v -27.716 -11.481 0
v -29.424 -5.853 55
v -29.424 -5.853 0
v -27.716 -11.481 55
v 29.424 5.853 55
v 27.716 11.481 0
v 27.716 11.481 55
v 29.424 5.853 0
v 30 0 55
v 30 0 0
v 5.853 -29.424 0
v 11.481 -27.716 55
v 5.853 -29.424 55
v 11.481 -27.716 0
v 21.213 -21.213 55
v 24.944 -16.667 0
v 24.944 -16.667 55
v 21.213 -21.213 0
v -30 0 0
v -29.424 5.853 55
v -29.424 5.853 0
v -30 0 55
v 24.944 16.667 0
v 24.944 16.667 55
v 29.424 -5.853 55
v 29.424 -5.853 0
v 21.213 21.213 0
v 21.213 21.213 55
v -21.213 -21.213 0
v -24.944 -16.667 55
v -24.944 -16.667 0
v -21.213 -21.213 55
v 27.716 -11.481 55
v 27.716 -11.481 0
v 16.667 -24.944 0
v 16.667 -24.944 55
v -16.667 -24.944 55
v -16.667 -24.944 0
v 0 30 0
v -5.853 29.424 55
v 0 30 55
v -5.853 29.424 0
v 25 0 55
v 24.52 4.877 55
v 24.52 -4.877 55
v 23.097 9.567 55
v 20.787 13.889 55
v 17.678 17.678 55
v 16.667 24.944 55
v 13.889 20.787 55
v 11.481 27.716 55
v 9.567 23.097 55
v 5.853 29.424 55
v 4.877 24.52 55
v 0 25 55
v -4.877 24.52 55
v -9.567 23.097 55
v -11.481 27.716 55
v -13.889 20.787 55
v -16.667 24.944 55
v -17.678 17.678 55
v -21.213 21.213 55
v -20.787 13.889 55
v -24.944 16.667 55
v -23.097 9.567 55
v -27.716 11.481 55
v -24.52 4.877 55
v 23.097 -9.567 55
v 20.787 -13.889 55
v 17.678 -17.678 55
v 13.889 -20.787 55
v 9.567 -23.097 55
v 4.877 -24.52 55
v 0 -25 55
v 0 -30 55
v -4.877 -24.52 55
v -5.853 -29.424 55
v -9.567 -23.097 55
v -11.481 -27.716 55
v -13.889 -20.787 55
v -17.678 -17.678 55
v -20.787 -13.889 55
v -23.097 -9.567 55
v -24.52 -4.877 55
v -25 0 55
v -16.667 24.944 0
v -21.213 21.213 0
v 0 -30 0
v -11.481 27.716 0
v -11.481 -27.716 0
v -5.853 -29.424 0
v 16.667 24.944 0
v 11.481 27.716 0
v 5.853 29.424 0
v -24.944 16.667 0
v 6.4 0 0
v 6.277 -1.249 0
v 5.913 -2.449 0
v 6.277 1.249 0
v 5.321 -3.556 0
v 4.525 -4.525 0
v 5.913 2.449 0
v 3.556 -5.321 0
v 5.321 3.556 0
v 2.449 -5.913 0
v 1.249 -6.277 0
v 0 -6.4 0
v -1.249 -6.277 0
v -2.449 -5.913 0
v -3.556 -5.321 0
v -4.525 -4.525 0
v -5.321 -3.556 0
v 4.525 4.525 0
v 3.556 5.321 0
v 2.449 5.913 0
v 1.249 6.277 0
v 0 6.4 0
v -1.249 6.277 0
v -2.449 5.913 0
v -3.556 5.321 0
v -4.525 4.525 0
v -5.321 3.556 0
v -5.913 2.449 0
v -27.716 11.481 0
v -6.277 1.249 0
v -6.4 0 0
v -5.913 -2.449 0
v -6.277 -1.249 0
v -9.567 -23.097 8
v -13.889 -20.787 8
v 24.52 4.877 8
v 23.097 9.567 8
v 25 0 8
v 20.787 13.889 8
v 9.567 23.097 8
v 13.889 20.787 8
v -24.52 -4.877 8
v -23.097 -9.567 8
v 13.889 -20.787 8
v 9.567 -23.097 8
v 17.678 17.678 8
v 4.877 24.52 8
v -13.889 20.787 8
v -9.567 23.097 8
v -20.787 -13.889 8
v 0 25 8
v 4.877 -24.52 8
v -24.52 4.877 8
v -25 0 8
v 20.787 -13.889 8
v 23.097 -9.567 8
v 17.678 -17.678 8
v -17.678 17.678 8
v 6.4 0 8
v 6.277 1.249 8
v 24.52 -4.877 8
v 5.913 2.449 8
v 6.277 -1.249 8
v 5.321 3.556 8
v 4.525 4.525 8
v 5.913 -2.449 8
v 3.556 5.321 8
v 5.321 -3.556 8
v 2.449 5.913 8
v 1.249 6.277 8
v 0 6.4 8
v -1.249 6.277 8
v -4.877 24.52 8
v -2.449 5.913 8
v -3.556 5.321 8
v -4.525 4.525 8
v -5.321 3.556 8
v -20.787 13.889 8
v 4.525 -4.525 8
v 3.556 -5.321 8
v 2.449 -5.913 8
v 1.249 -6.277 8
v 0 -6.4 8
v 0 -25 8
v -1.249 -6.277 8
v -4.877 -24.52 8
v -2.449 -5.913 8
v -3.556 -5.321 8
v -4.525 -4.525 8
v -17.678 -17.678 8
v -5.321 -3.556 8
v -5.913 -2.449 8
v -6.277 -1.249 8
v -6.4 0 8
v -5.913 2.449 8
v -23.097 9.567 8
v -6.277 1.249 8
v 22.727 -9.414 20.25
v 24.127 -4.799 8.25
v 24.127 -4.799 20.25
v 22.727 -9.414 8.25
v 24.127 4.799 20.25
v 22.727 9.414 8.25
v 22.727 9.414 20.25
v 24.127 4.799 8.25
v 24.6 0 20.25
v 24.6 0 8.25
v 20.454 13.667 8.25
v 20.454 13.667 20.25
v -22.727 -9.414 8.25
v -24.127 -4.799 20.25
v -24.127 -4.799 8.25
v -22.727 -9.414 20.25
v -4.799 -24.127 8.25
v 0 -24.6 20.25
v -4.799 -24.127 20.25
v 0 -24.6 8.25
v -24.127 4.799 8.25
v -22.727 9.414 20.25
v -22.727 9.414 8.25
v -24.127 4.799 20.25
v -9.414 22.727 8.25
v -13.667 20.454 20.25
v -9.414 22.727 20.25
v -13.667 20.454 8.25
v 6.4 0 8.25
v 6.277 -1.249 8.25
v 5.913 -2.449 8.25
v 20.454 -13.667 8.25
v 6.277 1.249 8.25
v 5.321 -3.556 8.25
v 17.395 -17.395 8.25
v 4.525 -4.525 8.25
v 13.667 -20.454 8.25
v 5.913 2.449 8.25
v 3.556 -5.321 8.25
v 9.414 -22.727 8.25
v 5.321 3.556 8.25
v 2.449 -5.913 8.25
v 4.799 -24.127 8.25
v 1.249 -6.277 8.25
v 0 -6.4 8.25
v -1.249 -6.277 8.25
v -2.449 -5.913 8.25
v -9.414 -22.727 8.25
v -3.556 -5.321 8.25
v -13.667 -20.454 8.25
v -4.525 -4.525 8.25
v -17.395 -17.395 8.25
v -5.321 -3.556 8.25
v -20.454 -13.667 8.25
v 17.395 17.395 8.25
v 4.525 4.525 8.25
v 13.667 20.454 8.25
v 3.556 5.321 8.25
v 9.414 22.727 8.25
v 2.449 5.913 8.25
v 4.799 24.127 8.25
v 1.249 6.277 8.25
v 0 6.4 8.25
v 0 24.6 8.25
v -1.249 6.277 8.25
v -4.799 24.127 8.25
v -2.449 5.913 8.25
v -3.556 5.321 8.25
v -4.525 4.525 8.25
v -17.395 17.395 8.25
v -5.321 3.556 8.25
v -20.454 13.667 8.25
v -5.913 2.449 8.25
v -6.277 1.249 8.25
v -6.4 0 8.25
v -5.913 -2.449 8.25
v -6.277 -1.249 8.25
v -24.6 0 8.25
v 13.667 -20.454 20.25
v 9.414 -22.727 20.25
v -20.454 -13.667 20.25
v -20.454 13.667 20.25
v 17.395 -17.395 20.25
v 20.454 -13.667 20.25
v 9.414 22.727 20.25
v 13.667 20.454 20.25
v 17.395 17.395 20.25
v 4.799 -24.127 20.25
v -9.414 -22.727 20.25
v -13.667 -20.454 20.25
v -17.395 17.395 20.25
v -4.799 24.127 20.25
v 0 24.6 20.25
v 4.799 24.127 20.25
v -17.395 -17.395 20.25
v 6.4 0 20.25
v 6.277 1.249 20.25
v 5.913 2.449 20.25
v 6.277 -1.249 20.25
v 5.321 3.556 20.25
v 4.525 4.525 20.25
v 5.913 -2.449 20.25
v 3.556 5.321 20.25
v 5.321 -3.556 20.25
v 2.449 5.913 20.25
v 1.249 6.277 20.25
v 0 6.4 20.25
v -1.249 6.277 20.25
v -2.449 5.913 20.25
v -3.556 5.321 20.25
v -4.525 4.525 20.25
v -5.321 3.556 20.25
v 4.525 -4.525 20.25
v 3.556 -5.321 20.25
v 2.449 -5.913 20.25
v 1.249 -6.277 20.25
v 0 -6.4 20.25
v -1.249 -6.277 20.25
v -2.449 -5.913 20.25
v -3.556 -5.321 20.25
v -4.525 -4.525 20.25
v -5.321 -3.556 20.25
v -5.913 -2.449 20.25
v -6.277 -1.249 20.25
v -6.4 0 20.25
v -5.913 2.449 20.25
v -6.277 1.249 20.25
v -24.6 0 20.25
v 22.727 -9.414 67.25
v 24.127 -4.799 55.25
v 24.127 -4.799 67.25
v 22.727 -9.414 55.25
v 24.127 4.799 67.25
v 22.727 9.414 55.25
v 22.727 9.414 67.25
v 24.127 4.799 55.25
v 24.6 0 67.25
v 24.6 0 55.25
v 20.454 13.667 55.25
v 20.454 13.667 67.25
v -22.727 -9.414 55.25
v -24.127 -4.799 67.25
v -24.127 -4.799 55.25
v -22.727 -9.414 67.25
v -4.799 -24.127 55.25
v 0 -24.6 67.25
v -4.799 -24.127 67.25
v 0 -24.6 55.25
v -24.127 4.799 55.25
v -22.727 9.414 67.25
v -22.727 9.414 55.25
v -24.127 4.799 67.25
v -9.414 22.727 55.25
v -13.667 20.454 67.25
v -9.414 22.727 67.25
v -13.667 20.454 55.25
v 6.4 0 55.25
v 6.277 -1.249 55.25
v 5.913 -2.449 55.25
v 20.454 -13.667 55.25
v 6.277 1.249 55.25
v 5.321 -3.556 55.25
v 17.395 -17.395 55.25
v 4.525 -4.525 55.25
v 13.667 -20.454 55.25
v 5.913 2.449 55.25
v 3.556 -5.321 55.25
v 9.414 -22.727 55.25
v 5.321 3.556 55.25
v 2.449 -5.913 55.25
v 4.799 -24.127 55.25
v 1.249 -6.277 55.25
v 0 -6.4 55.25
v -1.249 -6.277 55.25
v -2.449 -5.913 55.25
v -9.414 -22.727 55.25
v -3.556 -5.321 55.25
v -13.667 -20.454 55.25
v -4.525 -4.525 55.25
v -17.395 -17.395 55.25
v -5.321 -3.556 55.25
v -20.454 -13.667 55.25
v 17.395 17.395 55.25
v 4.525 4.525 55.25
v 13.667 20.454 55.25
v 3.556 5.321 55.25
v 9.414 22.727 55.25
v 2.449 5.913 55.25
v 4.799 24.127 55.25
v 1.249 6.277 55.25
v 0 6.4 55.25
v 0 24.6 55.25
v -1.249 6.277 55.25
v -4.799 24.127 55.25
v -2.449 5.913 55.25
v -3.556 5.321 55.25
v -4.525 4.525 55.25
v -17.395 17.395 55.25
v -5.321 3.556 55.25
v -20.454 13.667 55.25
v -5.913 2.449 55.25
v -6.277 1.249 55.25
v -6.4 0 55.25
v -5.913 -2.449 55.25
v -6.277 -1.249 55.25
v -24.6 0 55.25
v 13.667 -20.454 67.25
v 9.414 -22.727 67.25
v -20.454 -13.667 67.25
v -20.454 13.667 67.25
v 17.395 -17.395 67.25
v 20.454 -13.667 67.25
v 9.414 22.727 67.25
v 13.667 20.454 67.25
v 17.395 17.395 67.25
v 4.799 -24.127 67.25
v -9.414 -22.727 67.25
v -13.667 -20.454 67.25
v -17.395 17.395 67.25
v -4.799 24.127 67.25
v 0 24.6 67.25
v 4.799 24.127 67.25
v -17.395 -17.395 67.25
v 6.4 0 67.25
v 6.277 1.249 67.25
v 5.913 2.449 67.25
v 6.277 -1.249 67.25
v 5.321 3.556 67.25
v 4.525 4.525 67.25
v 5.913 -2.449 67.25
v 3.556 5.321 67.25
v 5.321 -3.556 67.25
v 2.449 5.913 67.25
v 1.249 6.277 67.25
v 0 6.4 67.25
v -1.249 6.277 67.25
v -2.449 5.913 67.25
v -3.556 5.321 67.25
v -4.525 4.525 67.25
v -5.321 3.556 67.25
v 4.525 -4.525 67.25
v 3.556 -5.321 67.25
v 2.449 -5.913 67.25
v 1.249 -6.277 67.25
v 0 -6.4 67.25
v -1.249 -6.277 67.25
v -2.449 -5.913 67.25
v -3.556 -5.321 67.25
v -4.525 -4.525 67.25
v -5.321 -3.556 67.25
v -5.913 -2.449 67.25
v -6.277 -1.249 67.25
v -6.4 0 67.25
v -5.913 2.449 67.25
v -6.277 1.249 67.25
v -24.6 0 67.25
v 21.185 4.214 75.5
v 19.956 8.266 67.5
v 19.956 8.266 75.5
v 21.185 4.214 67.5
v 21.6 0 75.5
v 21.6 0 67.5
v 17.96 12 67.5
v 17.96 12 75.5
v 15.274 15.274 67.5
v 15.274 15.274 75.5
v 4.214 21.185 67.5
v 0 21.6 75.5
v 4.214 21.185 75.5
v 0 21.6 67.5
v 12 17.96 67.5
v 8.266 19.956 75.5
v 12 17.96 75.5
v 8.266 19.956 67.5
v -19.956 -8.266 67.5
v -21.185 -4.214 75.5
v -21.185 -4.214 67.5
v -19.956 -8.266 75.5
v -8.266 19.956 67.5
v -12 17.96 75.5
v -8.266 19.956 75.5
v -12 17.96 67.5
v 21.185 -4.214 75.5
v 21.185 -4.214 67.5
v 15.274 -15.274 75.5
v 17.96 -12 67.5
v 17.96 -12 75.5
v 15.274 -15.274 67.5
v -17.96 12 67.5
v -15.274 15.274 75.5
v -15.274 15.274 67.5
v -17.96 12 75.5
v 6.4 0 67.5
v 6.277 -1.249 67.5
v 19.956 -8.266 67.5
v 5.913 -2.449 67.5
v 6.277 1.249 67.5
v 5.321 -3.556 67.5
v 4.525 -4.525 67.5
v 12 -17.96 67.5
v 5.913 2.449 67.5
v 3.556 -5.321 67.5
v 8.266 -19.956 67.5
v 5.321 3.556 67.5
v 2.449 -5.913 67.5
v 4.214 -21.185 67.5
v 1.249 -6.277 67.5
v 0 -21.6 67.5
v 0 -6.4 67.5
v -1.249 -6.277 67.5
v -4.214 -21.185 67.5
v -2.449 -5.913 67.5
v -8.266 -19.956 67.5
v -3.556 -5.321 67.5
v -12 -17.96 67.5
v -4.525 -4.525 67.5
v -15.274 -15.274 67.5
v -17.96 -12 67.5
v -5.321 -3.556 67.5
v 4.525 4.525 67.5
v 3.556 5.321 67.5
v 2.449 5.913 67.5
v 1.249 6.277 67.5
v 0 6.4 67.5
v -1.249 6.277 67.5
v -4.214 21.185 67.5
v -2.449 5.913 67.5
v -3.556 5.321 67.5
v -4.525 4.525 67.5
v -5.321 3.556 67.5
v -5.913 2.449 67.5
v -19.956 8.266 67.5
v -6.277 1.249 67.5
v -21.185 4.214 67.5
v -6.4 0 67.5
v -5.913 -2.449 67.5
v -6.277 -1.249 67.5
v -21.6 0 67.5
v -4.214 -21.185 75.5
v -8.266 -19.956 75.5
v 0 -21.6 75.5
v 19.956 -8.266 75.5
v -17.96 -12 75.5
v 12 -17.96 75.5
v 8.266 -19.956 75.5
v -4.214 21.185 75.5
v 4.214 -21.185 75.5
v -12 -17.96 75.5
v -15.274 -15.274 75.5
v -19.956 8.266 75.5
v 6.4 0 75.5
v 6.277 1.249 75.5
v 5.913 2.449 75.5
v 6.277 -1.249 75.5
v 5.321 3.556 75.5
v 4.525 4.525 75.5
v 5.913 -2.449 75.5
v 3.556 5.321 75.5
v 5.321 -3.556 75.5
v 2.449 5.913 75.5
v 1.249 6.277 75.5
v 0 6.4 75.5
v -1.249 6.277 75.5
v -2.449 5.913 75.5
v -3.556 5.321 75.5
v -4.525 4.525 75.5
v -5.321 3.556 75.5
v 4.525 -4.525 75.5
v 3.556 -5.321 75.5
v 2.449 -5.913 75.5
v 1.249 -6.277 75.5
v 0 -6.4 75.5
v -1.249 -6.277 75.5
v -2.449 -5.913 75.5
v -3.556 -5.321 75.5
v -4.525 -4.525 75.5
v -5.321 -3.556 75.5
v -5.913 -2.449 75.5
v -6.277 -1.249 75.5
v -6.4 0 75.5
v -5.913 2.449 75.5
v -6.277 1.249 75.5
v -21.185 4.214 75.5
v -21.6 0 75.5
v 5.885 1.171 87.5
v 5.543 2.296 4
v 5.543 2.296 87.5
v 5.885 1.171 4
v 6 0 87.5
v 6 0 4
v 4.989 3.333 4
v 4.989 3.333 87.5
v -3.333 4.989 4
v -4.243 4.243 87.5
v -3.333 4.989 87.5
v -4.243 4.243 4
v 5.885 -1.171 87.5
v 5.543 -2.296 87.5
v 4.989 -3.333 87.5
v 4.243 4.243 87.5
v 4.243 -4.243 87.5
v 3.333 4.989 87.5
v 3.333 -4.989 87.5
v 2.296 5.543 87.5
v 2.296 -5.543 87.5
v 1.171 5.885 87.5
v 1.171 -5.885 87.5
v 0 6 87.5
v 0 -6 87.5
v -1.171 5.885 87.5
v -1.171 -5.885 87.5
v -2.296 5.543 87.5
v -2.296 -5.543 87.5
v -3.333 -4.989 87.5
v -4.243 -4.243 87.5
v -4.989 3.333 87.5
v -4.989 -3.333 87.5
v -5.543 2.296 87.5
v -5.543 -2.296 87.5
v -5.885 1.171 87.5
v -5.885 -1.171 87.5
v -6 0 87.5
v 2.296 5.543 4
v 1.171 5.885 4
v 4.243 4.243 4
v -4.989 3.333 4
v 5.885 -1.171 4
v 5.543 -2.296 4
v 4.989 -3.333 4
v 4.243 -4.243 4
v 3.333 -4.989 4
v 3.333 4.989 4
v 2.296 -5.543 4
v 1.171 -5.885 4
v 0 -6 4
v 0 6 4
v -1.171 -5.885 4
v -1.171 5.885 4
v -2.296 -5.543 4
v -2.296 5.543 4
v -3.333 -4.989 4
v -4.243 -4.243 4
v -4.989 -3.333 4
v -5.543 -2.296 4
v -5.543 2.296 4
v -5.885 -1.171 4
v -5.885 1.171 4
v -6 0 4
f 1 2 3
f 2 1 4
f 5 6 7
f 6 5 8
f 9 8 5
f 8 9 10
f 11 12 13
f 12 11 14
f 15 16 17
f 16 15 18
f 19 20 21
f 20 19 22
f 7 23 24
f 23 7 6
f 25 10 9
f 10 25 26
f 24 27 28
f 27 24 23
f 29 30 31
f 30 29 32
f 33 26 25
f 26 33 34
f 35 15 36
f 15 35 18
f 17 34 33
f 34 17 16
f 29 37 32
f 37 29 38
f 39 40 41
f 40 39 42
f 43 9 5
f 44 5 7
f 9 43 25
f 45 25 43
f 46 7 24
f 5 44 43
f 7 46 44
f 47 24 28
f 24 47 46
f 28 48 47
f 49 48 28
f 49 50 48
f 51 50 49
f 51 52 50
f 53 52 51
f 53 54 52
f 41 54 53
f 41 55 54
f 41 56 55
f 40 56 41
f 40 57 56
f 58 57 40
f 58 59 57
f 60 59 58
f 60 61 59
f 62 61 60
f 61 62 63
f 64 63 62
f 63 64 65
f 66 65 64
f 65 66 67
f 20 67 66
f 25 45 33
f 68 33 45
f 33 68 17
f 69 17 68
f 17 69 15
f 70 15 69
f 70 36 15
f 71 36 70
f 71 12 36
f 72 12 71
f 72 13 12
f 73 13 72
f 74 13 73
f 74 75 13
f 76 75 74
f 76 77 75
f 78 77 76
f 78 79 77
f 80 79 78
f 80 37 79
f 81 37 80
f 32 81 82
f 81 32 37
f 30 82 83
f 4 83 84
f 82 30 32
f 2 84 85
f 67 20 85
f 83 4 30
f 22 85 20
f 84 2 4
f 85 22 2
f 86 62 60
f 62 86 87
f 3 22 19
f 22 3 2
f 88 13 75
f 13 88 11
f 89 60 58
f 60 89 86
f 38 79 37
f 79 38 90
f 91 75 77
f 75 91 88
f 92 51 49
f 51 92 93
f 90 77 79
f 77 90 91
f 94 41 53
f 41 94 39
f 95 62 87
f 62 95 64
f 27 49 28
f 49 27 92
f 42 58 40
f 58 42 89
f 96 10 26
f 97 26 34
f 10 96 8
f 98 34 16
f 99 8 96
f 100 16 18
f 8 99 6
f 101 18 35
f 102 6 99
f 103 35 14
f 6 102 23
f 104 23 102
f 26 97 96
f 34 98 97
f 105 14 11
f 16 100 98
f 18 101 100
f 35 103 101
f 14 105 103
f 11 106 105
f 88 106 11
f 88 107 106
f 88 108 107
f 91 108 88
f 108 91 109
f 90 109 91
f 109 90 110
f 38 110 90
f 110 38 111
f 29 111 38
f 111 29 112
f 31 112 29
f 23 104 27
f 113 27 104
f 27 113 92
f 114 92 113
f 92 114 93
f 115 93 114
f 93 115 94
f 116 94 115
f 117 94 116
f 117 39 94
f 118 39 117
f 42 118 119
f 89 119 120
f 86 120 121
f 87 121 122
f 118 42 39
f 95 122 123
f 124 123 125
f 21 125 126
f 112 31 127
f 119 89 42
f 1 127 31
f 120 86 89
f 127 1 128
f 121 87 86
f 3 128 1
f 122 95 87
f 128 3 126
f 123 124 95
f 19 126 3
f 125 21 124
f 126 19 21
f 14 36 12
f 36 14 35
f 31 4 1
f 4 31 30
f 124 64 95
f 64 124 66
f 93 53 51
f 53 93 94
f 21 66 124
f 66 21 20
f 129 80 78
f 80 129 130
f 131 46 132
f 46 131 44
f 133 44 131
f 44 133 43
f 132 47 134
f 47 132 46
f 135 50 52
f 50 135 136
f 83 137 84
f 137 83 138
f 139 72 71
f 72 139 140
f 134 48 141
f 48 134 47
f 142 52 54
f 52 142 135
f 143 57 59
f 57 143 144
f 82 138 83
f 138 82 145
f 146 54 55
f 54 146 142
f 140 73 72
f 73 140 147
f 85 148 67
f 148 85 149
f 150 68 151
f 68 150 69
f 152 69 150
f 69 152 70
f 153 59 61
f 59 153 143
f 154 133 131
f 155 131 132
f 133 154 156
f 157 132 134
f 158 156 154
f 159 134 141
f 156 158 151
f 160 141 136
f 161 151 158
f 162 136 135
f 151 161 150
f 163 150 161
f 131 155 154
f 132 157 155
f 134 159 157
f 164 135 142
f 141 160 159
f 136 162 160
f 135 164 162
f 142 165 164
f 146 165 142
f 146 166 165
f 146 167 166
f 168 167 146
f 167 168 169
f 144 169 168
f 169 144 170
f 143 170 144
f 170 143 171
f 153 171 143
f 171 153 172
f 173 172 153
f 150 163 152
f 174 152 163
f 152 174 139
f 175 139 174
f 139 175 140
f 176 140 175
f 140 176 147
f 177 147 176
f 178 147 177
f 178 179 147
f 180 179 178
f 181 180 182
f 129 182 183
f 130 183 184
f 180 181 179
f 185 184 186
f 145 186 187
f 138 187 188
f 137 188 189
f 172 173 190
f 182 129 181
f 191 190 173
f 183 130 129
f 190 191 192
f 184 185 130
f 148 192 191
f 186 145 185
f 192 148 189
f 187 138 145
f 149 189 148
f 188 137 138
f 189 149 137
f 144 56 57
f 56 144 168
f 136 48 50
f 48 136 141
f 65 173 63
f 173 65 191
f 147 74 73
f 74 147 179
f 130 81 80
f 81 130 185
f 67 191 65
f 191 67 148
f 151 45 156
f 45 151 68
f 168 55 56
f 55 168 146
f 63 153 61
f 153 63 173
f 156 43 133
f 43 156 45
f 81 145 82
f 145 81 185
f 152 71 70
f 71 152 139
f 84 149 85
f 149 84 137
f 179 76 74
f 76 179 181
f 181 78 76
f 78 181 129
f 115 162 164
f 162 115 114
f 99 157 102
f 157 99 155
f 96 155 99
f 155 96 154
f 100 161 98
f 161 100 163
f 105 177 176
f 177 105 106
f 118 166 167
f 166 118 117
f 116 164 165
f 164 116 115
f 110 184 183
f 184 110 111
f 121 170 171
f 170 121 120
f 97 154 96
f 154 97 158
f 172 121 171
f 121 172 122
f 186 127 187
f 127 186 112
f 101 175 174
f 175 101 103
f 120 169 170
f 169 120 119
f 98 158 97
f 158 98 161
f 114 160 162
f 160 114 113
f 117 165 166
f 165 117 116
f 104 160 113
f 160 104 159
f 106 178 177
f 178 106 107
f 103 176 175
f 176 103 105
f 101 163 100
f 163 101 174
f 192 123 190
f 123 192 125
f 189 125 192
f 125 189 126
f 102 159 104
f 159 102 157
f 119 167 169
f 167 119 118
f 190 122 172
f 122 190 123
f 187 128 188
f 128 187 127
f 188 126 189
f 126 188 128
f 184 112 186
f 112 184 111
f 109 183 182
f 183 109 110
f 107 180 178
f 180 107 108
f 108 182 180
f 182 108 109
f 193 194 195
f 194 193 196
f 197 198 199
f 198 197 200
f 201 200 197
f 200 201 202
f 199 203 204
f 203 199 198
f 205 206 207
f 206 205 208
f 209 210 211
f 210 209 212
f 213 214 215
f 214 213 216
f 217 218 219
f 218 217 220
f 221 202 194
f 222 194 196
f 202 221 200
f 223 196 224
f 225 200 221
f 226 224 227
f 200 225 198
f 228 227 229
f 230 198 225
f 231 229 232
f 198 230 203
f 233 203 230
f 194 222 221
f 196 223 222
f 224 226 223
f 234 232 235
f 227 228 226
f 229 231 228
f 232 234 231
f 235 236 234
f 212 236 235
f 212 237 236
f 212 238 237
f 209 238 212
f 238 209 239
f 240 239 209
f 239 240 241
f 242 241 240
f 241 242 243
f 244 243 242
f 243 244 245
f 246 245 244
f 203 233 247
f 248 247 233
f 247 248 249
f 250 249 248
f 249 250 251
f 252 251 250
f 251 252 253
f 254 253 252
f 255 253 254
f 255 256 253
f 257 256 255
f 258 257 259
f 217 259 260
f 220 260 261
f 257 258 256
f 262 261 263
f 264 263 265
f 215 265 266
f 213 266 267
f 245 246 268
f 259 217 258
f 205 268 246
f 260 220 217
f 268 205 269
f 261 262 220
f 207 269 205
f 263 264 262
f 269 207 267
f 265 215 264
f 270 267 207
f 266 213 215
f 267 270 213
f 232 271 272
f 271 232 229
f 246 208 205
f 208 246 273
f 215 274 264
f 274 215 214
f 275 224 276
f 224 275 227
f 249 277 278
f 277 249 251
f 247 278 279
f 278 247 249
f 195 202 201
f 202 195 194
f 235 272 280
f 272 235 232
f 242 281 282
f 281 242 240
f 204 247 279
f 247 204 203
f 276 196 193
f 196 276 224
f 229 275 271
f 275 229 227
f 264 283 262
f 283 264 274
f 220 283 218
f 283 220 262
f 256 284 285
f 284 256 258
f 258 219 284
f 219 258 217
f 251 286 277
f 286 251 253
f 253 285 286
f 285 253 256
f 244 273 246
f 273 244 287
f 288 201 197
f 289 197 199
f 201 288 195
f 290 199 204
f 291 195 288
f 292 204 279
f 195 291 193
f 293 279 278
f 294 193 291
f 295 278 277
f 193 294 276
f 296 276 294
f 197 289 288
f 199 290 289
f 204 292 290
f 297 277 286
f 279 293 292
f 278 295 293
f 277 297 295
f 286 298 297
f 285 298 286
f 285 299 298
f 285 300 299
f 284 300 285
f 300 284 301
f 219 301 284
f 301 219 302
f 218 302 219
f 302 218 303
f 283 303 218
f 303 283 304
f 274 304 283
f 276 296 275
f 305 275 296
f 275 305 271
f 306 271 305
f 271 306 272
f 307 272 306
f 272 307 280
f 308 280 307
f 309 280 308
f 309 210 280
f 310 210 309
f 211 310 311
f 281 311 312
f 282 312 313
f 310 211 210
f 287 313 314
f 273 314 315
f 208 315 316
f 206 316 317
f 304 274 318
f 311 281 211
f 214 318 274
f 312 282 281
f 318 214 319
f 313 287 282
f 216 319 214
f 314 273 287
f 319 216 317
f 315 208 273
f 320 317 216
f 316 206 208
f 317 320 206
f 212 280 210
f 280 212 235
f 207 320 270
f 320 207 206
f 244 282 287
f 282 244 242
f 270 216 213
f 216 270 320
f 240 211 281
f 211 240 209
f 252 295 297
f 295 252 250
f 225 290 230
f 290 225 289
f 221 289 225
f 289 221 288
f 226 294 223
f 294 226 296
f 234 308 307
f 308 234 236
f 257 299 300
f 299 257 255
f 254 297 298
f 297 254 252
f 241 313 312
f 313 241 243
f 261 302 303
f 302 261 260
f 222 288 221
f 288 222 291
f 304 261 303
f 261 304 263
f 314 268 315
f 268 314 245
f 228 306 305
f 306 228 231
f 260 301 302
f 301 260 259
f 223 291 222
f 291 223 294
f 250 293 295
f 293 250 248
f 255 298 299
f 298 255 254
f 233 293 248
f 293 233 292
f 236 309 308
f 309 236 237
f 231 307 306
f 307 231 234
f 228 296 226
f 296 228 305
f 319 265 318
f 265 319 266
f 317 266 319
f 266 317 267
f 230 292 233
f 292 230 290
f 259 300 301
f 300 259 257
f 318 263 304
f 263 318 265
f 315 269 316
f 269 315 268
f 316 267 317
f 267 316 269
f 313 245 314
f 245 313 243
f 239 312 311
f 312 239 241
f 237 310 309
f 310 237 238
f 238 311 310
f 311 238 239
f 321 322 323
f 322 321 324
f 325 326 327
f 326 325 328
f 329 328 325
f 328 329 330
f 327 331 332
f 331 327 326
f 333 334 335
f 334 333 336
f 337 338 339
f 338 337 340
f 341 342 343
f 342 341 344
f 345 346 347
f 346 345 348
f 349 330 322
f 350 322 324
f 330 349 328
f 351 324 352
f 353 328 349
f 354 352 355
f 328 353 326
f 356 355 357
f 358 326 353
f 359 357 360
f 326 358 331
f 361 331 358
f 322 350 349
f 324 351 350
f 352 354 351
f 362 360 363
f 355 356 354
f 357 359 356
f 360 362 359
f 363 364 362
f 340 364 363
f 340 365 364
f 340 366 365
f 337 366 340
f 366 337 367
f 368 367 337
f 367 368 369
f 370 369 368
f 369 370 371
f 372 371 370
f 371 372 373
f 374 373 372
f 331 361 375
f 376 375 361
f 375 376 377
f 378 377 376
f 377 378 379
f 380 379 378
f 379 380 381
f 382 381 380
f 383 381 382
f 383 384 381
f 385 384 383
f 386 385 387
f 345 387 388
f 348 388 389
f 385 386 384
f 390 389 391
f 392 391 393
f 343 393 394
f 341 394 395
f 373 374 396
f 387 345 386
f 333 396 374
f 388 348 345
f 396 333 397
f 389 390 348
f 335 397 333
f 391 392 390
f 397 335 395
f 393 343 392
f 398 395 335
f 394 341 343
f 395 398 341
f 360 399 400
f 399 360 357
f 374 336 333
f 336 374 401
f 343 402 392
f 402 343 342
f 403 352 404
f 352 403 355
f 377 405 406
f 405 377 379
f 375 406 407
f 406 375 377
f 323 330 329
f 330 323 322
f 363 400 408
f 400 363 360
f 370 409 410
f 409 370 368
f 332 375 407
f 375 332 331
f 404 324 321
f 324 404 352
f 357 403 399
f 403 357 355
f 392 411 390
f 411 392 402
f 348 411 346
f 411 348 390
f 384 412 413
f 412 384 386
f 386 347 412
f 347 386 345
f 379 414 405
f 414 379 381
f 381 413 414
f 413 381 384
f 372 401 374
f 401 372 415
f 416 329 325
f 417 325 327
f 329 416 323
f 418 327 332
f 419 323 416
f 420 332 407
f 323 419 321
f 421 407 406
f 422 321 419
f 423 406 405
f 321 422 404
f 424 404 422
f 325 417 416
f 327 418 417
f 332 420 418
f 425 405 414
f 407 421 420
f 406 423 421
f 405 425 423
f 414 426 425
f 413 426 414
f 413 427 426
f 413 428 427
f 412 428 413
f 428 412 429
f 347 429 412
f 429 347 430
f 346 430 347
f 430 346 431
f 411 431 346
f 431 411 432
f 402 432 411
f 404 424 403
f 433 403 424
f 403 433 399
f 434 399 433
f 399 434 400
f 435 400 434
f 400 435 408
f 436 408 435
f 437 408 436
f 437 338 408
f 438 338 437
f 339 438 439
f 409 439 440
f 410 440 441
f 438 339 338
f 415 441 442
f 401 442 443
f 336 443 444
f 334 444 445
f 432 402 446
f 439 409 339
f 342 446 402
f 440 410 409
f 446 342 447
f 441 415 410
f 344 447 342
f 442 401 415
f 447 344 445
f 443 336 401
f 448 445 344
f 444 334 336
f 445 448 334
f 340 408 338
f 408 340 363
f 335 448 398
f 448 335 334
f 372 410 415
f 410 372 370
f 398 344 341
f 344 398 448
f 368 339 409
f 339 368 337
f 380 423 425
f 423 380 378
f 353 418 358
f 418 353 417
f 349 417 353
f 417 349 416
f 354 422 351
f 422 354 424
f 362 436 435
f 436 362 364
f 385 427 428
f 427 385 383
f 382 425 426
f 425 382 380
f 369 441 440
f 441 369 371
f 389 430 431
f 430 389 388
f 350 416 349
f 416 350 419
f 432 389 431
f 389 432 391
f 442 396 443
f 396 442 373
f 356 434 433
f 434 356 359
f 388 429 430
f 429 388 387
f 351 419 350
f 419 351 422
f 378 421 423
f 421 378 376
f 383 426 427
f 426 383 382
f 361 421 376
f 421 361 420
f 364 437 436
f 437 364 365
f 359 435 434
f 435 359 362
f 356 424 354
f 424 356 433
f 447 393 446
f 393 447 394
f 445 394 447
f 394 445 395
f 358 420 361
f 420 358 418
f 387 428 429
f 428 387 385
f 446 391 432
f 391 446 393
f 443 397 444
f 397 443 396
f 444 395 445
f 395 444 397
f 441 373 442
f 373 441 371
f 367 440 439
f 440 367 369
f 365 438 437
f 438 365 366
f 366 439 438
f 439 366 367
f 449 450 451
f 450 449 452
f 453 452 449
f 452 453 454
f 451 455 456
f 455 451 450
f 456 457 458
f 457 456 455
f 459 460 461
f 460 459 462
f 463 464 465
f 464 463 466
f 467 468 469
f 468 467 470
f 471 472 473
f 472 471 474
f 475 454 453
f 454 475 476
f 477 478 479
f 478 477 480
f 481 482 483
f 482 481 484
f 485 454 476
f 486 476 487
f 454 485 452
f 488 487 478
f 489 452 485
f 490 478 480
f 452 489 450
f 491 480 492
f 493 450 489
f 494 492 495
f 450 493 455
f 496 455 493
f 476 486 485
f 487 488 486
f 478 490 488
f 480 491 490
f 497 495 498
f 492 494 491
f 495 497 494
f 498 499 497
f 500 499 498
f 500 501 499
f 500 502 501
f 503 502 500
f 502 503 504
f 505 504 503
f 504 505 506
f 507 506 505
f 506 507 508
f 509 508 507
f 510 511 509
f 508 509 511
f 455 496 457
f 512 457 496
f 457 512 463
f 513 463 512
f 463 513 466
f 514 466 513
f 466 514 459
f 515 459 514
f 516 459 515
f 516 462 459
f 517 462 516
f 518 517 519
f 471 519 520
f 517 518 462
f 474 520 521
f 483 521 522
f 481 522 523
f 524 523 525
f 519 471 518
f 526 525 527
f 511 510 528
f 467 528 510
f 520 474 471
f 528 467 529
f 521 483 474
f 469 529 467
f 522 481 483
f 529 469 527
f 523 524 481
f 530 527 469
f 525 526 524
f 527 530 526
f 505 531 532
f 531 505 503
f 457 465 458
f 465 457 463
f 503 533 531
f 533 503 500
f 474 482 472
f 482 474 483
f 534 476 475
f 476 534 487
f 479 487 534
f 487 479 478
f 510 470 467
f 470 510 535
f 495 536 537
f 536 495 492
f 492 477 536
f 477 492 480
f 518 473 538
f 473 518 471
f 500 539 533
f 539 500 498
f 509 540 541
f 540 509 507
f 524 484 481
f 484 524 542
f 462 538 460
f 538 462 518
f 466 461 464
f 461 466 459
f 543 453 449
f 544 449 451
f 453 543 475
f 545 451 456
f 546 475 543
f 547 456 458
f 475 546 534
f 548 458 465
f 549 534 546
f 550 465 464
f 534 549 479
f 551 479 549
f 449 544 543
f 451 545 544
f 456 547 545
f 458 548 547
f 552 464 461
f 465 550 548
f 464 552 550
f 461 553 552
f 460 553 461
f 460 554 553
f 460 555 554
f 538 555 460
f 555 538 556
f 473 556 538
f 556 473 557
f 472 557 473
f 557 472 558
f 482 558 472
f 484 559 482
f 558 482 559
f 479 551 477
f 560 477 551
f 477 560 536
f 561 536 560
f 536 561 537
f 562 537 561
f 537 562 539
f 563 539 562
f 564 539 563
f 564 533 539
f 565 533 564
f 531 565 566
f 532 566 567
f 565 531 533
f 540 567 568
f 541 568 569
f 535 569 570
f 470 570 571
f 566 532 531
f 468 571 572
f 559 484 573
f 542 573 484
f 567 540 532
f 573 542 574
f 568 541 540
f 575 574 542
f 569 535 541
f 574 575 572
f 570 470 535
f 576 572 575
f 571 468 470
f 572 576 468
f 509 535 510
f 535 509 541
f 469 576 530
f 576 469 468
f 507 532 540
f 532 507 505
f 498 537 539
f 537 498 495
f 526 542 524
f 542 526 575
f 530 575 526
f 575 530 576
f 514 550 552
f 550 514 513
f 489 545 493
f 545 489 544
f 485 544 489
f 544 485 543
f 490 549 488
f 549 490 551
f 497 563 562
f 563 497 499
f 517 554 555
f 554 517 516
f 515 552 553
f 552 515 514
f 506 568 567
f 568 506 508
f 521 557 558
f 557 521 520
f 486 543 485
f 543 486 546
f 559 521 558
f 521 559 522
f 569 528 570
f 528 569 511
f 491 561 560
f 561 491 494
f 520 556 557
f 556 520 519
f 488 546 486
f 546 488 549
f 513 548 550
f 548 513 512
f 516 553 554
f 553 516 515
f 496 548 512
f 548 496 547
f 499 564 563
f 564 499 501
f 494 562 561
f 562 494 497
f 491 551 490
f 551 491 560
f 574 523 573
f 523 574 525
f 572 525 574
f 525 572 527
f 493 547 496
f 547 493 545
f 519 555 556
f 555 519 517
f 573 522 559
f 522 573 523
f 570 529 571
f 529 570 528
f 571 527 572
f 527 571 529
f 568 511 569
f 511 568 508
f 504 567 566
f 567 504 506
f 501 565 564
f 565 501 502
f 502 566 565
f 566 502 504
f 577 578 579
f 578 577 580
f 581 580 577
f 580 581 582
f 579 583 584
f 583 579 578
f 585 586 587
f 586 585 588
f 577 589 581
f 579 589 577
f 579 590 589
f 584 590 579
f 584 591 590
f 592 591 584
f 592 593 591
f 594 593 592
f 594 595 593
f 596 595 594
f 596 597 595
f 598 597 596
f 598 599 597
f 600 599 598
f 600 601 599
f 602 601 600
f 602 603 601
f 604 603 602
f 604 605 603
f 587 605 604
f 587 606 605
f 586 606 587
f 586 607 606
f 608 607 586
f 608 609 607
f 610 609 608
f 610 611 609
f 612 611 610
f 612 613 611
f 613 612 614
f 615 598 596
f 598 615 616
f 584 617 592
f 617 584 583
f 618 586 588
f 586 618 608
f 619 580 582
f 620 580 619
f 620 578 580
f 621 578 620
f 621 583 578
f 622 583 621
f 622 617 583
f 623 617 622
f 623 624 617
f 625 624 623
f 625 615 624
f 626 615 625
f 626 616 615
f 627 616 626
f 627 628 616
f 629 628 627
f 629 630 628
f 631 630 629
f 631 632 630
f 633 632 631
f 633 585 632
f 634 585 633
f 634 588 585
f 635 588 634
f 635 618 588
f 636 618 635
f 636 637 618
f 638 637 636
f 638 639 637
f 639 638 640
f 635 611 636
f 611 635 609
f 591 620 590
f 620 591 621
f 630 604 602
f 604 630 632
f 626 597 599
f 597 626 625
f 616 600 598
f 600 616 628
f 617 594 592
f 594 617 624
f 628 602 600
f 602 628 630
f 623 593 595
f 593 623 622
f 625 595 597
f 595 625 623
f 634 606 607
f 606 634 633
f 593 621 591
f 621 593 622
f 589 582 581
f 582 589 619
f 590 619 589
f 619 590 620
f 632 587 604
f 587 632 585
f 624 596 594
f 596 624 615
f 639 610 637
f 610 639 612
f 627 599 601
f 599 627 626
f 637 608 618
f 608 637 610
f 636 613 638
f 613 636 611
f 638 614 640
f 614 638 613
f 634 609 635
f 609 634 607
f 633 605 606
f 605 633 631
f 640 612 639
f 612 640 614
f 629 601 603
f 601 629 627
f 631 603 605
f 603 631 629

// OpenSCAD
$fn = 32;

// ------------------------------------------------------------------------
// Bearing housing: housing d60, two bearings and a shaft
// Every part is its own module, assembly() places them once.
// ------------------------------------------------------------------------

// --- part 1 ---
module housing() {
  difference() {
    cylinder(h = 55, d = 60);
    translate([0, 0, 8]) cylinder(h = 48, d = 50);
    translate([0, 0, -1]) cylinder(h = 10, d = 12.8);
  }
}

// --- part 2 ---
module bearing_lower() {
  difference() {
      translate([0, 0, 0]) cylinder(h = 12, d = 49.2);
      translate([0, 0, -1]) cylinder(h = 14, d = 12.8);
    }
}

// --- part 3 ---
module bearing_upper() {
  difference() {
      translate([0, 0, 0]) cylinder(h = 12, d = 49.2);
      translate([0, 0, -1]) cylinder(h = 14, d = 12.8);
    }
}

// --- part 4 ---
module spacer() {
  difference() {
      translate([0, 0, 0]) cylinder(h = 8, d = 43.2);
      translate([0, 0, -1]) cylinder(h = 10, d = 12.8);
    }
}

// --- part 5 ---
module shaft() {
  translate([0, 0, -41.75]) cylinder(h = 83.5, d = 12);
}

// --- assembly ---
module assembly() {
  translate([0, 0, 0]) rotate([0, 0, 0]) housing();
  translate([0, 0, 8.25]) rotate([0, 0, 0]) bearing_lower();
  translate([0, 0, 55.25]) rotate([0, 0, 0]) bearing_upper();
  translate([0, 0, 67.5]) rotate([0, 0, 0]) spacer();
  translate([0, 0, 45.75]) rotate([0, 0, 0]) shaft();
}

assembly();
